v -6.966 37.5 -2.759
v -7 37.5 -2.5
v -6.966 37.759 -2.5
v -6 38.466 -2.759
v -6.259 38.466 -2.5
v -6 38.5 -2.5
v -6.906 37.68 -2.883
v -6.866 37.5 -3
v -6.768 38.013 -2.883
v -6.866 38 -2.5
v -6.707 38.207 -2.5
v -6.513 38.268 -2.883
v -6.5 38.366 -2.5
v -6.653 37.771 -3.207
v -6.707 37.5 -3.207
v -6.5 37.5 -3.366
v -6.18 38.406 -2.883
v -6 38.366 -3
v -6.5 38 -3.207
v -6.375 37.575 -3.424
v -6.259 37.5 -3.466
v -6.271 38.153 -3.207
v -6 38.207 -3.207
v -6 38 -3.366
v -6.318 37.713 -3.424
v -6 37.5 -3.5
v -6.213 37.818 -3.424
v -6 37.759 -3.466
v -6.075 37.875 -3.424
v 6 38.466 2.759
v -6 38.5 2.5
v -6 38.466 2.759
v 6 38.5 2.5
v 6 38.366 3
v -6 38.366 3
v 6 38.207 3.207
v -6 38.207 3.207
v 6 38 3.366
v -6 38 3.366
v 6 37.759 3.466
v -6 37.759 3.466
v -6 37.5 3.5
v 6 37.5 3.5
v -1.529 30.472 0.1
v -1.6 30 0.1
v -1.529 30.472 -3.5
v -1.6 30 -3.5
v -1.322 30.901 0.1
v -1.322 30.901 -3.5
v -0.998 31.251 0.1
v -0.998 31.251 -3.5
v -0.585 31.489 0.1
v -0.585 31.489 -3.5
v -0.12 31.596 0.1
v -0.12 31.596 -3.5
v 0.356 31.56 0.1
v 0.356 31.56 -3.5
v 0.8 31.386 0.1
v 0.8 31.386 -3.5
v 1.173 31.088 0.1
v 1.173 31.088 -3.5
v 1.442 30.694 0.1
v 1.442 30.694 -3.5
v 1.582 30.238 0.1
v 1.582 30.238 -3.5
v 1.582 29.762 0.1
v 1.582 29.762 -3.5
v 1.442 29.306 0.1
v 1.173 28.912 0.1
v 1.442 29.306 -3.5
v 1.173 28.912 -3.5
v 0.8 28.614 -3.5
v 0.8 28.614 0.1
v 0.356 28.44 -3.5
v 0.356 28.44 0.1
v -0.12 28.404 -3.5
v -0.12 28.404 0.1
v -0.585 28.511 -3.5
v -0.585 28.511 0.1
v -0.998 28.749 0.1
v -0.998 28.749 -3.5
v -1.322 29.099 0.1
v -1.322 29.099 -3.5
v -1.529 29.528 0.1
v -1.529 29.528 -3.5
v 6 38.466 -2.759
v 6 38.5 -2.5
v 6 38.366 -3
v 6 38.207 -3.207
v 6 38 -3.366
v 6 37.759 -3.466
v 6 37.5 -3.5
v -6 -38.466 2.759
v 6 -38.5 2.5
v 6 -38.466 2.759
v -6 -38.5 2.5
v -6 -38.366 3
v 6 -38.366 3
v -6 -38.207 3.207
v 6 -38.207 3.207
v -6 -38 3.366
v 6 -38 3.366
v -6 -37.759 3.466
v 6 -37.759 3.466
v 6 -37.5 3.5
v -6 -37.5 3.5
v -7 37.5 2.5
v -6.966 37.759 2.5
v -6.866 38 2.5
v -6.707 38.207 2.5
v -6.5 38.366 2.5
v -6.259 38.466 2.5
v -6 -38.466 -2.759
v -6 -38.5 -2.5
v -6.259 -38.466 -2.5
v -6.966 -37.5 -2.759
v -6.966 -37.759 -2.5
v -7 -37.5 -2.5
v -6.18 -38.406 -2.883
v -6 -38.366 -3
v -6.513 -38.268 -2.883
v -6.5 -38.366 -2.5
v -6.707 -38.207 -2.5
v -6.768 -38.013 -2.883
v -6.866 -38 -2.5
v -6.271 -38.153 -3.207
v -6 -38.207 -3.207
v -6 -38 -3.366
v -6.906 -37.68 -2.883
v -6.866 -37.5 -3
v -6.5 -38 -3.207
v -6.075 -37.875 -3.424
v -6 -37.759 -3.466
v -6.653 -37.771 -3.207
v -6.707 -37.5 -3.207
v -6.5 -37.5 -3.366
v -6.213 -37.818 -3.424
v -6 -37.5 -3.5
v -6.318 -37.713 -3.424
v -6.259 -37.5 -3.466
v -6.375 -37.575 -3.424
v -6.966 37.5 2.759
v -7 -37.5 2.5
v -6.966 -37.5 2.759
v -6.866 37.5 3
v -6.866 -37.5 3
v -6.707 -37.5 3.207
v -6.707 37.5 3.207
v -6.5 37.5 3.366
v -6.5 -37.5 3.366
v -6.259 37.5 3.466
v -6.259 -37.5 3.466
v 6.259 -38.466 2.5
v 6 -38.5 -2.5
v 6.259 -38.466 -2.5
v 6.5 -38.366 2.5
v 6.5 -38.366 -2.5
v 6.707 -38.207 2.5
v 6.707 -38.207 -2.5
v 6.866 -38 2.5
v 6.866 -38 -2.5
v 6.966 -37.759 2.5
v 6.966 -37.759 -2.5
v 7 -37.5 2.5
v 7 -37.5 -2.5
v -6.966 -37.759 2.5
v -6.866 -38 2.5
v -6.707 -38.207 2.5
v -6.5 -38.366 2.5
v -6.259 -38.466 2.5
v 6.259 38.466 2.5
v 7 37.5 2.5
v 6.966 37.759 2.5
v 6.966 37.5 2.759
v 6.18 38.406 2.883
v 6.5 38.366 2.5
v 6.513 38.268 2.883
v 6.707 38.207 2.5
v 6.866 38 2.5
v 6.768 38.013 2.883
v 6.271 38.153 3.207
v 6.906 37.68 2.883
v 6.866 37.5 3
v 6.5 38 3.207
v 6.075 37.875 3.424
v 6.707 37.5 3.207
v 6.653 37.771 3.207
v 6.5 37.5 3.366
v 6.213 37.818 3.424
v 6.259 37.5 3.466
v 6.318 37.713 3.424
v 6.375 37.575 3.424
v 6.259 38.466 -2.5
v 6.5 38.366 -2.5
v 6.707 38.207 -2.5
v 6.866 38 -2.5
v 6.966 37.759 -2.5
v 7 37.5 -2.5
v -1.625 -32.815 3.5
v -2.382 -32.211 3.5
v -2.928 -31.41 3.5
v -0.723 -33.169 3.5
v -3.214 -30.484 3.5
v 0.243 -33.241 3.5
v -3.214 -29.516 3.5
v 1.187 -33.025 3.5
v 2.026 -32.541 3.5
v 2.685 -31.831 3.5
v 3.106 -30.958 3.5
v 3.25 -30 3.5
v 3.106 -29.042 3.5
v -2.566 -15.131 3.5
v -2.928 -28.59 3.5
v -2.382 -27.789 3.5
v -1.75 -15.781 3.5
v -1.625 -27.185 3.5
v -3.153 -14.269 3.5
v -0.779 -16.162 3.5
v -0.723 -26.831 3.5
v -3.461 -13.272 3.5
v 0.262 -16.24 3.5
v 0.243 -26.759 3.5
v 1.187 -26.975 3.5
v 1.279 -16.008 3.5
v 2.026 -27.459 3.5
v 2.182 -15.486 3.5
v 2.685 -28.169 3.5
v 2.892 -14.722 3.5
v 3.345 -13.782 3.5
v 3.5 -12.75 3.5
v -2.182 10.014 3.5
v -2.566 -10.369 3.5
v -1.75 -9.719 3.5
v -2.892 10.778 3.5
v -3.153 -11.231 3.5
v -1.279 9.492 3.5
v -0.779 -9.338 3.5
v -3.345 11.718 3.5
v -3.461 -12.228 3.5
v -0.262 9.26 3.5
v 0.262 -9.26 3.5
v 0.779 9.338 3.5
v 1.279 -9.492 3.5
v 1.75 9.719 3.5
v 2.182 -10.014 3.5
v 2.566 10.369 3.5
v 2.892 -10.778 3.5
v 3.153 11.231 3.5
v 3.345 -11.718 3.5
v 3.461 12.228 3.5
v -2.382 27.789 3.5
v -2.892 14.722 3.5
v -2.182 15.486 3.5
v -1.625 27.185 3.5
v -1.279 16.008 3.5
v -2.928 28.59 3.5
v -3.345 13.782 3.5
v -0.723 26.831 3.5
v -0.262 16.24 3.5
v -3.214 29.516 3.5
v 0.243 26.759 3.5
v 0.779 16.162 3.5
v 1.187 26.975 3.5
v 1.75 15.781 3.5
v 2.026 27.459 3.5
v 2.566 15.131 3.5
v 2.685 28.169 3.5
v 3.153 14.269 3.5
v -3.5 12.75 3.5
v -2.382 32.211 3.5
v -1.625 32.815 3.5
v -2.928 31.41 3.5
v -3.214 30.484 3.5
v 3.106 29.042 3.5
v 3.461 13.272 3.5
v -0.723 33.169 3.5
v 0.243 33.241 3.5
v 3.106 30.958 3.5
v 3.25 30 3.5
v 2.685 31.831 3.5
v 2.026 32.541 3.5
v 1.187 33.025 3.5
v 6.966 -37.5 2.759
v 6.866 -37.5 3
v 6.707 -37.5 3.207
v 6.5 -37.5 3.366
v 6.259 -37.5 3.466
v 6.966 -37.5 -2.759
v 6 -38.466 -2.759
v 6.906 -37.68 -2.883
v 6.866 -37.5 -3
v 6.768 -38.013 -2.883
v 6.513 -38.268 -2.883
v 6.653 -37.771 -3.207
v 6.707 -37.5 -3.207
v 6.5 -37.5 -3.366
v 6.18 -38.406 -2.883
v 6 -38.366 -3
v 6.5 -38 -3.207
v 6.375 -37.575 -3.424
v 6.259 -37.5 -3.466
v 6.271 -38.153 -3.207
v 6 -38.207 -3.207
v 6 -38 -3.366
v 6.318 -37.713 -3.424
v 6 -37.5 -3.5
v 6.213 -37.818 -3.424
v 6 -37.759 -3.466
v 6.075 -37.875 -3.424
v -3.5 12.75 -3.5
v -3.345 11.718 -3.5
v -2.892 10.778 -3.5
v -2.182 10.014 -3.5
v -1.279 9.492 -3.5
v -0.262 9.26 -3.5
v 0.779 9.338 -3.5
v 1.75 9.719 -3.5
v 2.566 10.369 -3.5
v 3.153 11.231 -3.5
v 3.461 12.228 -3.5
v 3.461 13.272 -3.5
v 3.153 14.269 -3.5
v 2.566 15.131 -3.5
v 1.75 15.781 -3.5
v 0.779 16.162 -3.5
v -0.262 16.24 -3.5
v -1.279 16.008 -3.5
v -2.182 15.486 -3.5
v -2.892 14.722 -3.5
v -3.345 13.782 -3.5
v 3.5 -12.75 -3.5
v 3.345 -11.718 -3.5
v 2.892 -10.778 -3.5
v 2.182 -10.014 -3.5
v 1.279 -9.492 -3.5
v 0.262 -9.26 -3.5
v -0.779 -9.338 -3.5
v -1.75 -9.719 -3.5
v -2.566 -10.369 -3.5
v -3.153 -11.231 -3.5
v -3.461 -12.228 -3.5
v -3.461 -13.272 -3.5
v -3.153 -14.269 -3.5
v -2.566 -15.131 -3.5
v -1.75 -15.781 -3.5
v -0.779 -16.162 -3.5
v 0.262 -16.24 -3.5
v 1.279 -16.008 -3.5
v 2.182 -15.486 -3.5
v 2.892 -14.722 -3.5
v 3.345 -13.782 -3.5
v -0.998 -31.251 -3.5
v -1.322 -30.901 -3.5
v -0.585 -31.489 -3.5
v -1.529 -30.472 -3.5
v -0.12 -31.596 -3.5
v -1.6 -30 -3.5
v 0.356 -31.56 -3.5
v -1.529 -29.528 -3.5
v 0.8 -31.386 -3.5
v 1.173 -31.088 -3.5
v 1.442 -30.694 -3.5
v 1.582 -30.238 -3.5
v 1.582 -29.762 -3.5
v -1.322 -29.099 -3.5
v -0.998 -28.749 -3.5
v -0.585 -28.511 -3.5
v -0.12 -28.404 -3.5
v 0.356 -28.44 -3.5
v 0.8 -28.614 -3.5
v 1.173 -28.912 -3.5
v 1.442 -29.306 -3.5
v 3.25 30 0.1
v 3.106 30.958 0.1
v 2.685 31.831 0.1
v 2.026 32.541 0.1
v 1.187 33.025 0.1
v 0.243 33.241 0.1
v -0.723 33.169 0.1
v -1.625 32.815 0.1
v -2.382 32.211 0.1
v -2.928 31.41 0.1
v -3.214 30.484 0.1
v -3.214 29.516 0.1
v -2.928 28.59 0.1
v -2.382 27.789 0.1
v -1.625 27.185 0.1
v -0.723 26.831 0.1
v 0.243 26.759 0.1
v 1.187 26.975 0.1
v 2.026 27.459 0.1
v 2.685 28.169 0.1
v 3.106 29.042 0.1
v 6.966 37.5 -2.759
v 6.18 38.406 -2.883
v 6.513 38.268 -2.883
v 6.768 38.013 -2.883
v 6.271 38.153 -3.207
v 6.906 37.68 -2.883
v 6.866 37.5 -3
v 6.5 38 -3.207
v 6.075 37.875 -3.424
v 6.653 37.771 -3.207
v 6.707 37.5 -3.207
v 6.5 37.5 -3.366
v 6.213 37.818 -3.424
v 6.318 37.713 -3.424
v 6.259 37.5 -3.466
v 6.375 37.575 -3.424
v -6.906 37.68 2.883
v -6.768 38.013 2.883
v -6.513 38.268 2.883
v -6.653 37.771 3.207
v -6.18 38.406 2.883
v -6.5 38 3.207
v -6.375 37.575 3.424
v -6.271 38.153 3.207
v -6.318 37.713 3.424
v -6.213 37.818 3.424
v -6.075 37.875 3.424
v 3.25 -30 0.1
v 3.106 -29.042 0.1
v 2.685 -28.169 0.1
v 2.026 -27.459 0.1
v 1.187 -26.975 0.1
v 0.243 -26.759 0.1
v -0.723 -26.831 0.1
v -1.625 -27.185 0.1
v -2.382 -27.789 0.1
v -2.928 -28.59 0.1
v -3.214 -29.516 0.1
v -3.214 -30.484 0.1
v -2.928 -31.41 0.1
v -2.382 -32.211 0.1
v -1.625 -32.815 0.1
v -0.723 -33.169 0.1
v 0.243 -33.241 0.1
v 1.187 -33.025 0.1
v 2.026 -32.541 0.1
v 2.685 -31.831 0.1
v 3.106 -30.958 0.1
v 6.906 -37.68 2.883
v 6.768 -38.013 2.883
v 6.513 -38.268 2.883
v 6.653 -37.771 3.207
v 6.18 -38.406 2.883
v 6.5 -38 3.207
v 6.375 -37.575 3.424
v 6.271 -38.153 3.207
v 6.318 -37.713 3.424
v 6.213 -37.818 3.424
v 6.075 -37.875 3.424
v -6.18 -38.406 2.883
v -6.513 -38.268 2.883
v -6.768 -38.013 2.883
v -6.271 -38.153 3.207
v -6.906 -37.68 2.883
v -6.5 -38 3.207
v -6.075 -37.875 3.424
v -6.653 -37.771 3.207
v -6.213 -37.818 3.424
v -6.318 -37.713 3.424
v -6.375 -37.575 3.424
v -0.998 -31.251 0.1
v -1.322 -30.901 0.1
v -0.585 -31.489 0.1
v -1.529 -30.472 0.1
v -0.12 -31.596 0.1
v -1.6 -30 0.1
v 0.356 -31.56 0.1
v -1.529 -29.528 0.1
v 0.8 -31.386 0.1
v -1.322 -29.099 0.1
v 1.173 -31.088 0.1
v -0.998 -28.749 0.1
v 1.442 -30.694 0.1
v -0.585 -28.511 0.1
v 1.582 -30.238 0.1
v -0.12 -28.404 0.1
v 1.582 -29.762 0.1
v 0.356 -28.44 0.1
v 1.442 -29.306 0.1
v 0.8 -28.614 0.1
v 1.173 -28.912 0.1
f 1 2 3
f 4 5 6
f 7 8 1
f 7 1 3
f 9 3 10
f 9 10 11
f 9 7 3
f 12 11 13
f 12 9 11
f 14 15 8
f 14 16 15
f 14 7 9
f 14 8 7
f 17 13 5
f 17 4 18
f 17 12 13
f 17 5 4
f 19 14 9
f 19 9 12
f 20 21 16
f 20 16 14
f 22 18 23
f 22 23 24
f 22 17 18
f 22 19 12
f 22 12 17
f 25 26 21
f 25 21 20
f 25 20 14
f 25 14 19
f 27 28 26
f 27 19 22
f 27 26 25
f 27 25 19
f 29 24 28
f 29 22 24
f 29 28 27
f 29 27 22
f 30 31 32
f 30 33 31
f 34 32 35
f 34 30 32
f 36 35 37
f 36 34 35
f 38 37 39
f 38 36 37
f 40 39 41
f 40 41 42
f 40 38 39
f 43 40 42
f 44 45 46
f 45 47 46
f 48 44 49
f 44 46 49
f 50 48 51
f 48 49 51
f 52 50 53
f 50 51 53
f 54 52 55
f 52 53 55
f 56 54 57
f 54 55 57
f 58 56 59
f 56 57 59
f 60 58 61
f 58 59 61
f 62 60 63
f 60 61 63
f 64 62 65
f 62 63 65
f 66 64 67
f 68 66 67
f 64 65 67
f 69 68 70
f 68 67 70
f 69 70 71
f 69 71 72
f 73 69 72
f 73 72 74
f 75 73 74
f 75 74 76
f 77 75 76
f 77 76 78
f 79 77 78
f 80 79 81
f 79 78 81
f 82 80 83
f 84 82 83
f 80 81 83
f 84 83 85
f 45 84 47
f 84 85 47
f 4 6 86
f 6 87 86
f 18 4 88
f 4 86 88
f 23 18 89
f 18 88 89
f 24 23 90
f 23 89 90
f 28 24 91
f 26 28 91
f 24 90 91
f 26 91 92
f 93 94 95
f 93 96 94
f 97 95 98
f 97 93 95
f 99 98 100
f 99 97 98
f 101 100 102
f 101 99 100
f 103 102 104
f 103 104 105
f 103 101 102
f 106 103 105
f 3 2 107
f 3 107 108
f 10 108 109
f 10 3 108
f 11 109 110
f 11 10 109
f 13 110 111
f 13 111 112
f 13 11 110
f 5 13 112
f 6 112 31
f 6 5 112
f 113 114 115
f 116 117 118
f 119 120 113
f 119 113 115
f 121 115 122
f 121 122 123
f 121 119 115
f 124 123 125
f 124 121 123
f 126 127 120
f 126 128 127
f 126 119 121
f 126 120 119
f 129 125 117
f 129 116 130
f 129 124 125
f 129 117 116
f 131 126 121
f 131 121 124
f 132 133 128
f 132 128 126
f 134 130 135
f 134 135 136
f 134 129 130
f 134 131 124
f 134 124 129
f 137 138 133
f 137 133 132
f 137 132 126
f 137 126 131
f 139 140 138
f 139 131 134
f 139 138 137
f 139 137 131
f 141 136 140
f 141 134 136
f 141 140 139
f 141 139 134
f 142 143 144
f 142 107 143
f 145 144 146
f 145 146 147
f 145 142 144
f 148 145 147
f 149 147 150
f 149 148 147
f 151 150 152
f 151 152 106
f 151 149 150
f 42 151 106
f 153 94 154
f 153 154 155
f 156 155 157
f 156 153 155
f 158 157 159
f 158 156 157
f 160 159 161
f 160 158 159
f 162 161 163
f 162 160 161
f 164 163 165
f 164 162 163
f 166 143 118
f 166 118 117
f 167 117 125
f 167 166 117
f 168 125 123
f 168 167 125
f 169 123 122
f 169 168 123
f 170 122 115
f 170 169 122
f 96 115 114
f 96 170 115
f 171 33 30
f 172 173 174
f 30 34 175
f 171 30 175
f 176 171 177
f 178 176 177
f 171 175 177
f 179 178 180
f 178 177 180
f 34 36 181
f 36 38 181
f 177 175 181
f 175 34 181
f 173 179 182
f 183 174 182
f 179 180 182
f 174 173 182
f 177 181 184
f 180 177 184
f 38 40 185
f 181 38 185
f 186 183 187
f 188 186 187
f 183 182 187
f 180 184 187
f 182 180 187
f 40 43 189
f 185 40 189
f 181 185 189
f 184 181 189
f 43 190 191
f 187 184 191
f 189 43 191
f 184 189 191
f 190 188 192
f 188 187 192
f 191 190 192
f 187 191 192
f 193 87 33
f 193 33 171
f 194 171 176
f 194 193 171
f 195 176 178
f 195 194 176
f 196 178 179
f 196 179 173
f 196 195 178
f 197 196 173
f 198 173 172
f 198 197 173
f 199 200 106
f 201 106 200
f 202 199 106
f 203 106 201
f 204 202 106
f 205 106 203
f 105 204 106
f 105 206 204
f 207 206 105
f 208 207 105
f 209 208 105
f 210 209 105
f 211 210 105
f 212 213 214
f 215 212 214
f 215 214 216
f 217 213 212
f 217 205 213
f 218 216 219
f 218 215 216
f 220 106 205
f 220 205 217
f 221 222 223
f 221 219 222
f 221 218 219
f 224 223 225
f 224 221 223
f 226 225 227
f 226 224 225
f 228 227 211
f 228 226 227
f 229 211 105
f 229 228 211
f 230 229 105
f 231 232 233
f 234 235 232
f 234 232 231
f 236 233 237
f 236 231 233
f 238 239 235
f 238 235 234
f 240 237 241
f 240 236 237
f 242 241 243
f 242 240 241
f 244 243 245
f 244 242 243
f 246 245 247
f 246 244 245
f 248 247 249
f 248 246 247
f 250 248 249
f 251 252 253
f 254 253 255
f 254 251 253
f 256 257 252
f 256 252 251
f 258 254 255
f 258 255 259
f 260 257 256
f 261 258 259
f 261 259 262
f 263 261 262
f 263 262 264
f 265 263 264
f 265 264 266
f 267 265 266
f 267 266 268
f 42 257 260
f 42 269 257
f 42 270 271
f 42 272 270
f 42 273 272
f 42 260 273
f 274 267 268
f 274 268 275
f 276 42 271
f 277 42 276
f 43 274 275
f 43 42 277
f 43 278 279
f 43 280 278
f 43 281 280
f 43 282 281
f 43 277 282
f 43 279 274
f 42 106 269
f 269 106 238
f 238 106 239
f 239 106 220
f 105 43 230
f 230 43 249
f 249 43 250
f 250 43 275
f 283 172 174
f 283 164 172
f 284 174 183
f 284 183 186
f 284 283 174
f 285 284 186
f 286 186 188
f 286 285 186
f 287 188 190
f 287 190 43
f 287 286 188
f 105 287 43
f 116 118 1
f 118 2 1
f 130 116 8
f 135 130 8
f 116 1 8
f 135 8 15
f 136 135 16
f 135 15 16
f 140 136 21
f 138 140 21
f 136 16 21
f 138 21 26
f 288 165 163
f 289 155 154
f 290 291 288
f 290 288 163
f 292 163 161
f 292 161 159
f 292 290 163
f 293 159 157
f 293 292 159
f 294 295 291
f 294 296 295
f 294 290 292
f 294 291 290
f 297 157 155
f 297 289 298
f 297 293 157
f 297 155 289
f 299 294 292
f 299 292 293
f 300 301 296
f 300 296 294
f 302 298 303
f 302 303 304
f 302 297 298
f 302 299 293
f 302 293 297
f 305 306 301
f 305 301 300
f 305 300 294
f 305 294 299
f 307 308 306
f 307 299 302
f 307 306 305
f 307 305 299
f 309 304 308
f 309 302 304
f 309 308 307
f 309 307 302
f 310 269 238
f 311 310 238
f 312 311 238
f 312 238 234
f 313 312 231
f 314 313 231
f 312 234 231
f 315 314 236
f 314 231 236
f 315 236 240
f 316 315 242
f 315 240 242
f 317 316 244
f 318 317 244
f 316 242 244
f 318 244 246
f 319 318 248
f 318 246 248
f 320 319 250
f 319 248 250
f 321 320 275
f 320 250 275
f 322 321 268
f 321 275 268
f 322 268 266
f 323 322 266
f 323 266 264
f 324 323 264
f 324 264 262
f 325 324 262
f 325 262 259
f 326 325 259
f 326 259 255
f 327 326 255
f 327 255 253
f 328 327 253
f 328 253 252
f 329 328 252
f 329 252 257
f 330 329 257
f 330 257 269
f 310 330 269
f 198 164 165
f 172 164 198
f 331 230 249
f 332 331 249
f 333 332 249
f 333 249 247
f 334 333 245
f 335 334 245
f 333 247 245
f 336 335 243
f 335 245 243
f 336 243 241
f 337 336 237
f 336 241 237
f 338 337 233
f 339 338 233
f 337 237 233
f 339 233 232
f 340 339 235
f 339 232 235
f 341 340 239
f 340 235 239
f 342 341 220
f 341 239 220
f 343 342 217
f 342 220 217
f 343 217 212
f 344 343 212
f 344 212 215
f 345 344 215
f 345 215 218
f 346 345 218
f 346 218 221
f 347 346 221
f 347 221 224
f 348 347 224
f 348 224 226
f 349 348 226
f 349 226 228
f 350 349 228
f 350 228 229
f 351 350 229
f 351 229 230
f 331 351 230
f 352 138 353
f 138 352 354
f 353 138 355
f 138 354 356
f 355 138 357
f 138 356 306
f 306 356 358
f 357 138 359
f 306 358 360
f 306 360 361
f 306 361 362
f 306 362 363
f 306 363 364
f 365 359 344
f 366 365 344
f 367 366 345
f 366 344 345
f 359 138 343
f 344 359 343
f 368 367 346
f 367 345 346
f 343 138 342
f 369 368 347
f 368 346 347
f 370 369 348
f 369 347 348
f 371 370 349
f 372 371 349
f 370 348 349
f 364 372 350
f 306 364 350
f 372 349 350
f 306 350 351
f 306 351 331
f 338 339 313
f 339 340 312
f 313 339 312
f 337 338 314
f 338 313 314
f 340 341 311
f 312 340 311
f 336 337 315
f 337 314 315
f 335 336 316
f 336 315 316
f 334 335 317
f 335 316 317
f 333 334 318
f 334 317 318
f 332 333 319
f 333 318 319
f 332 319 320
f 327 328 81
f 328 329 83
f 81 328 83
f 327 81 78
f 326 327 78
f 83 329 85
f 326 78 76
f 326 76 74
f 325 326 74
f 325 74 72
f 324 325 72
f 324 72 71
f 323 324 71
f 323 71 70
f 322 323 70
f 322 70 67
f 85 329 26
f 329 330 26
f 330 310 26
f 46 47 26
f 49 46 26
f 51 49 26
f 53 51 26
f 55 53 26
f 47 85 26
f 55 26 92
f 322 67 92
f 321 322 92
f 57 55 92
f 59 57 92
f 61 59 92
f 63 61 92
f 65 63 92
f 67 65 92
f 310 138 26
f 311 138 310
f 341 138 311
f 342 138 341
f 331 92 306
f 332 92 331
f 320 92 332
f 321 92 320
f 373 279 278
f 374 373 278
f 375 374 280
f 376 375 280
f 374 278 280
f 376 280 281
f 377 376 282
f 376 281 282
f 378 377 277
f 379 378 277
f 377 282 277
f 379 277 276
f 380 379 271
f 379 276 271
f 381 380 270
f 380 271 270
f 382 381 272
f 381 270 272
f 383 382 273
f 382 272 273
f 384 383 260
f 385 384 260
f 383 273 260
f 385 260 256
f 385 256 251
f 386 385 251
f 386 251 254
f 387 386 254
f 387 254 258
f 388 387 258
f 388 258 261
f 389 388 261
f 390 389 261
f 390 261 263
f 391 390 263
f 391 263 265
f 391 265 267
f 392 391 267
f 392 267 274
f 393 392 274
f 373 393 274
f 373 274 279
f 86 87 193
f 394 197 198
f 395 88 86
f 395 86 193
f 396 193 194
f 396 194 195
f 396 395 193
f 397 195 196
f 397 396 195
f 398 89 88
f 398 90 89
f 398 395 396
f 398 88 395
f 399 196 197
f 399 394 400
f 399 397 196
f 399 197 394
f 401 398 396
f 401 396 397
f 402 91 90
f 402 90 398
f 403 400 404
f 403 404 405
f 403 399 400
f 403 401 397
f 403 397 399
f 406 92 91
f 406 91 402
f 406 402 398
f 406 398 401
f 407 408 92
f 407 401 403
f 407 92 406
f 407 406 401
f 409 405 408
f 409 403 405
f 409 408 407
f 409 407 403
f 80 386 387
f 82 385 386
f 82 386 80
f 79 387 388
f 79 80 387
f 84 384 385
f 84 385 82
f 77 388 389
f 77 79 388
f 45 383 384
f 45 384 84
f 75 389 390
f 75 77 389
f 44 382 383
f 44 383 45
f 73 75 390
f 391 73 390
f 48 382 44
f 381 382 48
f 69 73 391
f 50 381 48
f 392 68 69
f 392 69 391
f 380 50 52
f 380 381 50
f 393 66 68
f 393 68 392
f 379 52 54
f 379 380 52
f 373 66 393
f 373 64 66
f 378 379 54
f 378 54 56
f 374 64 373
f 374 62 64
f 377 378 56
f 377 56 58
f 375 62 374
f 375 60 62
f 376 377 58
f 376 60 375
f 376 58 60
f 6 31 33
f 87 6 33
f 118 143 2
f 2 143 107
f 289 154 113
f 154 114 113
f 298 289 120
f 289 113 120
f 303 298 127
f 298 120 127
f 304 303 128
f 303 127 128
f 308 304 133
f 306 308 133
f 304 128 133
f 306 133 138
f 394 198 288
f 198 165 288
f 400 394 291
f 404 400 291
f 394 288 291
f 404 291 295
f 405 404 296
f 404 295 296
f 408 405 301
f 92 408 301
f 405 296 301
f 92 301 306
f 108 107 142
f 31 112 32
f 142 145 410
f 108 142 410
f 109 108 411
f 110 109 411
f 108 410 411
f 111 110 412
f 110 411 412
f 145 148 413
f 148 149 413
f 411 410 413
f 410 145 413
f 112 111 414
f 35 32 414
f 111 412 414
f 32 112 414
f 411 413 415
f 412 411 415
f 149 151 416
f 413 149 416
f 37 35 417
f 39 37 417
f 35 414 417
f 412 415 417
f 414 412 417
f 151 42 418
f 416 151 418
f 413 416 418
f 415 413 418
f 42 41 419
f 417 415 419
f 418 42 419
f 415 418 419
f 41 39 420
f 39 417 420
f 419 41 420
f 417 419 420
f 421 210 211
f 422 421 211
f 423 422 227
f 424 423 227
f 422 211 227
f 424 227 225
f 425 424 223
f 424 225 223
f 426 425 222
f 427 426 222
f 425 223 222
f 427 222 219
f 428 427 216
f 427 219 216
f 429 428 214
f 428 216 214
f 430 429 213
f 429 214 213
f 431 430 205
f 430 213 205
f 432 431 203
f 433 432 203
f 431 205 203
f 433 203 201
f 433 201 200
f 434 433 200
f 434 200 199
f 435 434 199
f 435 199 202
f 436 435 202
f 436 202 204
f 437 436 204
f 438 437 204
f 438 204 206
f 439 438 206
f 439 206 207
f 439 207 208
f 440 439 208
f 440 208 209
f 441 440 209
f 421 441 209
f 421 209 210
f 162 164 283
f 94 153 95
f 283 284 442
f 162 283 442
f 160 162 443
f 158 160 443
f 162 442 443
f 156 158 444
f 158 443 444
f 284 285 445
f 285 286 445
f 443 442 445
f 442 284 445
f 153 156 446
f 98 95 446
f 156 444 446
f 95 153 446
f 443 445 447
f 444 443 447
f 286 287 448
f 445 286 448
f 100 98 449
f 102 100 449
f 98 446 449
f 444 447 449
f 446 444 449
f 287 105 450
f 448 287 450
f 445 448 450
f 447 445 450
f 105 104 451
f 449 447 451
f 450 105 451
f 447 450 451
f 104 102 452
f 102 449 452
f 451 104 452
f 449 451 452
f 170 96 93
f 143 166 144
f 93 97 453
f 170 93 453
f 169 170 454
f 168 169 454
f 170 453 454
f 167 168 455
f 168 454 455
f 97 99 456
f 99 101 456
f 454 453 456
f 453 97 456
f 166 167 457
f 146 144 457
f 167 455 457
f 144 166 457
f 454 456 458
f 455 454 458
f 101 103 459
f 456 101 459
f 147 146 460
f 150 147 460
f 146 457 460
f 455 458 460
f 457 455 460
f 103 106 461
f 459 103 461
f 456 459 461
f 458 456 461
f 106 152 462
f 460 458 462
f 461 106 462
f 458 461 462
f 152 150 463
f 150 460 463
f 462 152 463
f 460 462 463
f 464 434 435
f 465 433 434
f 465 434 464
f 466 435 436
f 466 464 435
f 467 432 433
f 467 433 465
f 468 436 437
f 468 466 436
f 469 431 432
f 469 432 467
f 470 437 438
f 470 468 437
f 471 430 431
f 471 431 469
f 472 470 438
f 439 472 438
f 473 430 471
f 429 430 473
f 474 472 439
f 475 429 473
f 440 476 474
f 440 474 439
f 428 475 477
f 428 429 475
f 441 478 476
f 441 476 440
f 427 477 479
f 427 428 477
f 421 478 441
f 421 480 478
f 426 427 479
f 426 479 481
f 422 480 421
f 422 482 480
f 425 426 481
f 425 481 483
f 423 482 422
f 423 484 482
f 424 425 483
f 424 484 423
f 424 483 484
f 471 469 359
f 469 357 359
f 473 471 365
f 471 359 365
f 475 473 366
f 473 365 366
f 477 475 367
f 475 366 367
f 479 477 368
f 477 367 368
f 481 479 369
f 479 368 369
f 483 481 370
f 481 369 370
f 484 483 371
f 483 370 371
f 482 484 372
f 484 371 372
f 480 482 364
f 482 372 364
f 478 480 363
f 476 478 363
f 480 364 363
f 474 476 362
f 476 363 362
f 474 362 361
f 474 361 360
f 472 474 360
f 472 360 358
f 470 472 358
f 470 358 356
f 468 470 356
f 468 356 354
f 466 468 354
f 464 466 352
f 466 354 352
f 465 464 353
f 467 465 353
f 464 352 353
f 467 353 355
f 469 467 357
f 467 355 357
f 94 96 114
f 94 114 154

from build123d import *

# Parameters (mm, degrees)
SKETCH1_W                                           = 14
SKETCH1_H                                           = 77
BOSS_EXTRUDE1_DEPTH                                 = 3.5
CBORE_FOR_M3_HEX_SOCKET_HEAD_CAP_SCREW1_D           = 3.2
CBORE_FOR_M3_HEX_SOCKET_HEAD_CAP_SCREW1_CBORE_D     = 6.5
CBORE_FOR_M3_HEX_SOCKET_HEAD_CAP_SCREW1_CBORE_DEPTH = 3.4
SKETCH4_R                                           = 3.5
CUT_EXTRUDE1_DEPTH                                  = 40.752358421
FILLET1_R                                           = 1
FILLET2_R                                           = 1


with BuildPart() as part:
    # Sketch1 → Boss-Extrude1 (new, symmetric)
    with BuildSketch(Plane.XY):
        Rectangle(SKETCH1_W, SKETCH1_H)
    extrude(amount=BOSS_EXTRUDE1_DEPTH, both=True)

    # CBORE for M3 Hex Socket Head Cap Screw1 (through all)
    with Locations(Plane.XY.offset(3.5)):
        with Locations((0, -30), (0, 30)):
            CounterBoreHole(CBORE_FOR_M3_HEX_SOCKET_HEAD_CAP_SCREW1_D / 2, CBORE_FOR_M3_HEX_SOCKET_HEAD_CAP_SCREW1_CBORE_D / 2, CBORE_FOR_M3_HEX_SOCKET_HEAD_CAP_SCREW1_CBORE_DEPTH)

    # Sketch4 → Cut-Extrude1 (cut, through all)
    with BuildSketch(Plane.XY.offset(3.5)):
        with Locations((0, -12.75)):
            Circle(SKETCH4_R)
        with Locations(Location((0, 12.75, 0), (0, 0, 180))):
            Circle(SKETCH4_R)
    extrude(amount=-CUT_EXTRUDE1_DEPTH, mode=Mode.SUBTRACT)

    # Fillet1
    fillet1_edges = [part.edges().sort_by_distance(p)[0] for p in [
        (-7, 38.5, 0),
        (7, 38.5, 0),
        (7, -38.5, 0),
        (-7, -38.5, 0),
    ]]
    fillet(fillet1_edges, radius=FILLET1_R)

    # Fillet2
    fillet2_edges = [part.edges().sort_by_distance(p)[0] for p in [
        (-7, 0, -3.5),
        (-7, 0, 3.5),
        (0, 38.5, -3.5),
        (7, 0, -3.5),
        (0, -38.5, -3.5),
        (6.707106781, 38.207106781, -3.5),
        (6.707106781, -38.207106781, -3.5),
        (-6.707106781, -38.207106781, -3.5),
        (-6.707106781, 38.207106781, -3.5),
        (0, 38.5, 3.5),
        (0, -38.5, 3.5),
        (7, 0, 3.5),
        (6.707106781, 38.207106781, 3.5),
        (6.707106781, -38.207106781, 3.5),
        (-6.707106781, -38.207106781, 3.5),
        (-6.707106781, 38.207106781, 3.5),
    ]]
    fillet(fillet2_edges, radius=FILLET2_R)


solid = part.part
